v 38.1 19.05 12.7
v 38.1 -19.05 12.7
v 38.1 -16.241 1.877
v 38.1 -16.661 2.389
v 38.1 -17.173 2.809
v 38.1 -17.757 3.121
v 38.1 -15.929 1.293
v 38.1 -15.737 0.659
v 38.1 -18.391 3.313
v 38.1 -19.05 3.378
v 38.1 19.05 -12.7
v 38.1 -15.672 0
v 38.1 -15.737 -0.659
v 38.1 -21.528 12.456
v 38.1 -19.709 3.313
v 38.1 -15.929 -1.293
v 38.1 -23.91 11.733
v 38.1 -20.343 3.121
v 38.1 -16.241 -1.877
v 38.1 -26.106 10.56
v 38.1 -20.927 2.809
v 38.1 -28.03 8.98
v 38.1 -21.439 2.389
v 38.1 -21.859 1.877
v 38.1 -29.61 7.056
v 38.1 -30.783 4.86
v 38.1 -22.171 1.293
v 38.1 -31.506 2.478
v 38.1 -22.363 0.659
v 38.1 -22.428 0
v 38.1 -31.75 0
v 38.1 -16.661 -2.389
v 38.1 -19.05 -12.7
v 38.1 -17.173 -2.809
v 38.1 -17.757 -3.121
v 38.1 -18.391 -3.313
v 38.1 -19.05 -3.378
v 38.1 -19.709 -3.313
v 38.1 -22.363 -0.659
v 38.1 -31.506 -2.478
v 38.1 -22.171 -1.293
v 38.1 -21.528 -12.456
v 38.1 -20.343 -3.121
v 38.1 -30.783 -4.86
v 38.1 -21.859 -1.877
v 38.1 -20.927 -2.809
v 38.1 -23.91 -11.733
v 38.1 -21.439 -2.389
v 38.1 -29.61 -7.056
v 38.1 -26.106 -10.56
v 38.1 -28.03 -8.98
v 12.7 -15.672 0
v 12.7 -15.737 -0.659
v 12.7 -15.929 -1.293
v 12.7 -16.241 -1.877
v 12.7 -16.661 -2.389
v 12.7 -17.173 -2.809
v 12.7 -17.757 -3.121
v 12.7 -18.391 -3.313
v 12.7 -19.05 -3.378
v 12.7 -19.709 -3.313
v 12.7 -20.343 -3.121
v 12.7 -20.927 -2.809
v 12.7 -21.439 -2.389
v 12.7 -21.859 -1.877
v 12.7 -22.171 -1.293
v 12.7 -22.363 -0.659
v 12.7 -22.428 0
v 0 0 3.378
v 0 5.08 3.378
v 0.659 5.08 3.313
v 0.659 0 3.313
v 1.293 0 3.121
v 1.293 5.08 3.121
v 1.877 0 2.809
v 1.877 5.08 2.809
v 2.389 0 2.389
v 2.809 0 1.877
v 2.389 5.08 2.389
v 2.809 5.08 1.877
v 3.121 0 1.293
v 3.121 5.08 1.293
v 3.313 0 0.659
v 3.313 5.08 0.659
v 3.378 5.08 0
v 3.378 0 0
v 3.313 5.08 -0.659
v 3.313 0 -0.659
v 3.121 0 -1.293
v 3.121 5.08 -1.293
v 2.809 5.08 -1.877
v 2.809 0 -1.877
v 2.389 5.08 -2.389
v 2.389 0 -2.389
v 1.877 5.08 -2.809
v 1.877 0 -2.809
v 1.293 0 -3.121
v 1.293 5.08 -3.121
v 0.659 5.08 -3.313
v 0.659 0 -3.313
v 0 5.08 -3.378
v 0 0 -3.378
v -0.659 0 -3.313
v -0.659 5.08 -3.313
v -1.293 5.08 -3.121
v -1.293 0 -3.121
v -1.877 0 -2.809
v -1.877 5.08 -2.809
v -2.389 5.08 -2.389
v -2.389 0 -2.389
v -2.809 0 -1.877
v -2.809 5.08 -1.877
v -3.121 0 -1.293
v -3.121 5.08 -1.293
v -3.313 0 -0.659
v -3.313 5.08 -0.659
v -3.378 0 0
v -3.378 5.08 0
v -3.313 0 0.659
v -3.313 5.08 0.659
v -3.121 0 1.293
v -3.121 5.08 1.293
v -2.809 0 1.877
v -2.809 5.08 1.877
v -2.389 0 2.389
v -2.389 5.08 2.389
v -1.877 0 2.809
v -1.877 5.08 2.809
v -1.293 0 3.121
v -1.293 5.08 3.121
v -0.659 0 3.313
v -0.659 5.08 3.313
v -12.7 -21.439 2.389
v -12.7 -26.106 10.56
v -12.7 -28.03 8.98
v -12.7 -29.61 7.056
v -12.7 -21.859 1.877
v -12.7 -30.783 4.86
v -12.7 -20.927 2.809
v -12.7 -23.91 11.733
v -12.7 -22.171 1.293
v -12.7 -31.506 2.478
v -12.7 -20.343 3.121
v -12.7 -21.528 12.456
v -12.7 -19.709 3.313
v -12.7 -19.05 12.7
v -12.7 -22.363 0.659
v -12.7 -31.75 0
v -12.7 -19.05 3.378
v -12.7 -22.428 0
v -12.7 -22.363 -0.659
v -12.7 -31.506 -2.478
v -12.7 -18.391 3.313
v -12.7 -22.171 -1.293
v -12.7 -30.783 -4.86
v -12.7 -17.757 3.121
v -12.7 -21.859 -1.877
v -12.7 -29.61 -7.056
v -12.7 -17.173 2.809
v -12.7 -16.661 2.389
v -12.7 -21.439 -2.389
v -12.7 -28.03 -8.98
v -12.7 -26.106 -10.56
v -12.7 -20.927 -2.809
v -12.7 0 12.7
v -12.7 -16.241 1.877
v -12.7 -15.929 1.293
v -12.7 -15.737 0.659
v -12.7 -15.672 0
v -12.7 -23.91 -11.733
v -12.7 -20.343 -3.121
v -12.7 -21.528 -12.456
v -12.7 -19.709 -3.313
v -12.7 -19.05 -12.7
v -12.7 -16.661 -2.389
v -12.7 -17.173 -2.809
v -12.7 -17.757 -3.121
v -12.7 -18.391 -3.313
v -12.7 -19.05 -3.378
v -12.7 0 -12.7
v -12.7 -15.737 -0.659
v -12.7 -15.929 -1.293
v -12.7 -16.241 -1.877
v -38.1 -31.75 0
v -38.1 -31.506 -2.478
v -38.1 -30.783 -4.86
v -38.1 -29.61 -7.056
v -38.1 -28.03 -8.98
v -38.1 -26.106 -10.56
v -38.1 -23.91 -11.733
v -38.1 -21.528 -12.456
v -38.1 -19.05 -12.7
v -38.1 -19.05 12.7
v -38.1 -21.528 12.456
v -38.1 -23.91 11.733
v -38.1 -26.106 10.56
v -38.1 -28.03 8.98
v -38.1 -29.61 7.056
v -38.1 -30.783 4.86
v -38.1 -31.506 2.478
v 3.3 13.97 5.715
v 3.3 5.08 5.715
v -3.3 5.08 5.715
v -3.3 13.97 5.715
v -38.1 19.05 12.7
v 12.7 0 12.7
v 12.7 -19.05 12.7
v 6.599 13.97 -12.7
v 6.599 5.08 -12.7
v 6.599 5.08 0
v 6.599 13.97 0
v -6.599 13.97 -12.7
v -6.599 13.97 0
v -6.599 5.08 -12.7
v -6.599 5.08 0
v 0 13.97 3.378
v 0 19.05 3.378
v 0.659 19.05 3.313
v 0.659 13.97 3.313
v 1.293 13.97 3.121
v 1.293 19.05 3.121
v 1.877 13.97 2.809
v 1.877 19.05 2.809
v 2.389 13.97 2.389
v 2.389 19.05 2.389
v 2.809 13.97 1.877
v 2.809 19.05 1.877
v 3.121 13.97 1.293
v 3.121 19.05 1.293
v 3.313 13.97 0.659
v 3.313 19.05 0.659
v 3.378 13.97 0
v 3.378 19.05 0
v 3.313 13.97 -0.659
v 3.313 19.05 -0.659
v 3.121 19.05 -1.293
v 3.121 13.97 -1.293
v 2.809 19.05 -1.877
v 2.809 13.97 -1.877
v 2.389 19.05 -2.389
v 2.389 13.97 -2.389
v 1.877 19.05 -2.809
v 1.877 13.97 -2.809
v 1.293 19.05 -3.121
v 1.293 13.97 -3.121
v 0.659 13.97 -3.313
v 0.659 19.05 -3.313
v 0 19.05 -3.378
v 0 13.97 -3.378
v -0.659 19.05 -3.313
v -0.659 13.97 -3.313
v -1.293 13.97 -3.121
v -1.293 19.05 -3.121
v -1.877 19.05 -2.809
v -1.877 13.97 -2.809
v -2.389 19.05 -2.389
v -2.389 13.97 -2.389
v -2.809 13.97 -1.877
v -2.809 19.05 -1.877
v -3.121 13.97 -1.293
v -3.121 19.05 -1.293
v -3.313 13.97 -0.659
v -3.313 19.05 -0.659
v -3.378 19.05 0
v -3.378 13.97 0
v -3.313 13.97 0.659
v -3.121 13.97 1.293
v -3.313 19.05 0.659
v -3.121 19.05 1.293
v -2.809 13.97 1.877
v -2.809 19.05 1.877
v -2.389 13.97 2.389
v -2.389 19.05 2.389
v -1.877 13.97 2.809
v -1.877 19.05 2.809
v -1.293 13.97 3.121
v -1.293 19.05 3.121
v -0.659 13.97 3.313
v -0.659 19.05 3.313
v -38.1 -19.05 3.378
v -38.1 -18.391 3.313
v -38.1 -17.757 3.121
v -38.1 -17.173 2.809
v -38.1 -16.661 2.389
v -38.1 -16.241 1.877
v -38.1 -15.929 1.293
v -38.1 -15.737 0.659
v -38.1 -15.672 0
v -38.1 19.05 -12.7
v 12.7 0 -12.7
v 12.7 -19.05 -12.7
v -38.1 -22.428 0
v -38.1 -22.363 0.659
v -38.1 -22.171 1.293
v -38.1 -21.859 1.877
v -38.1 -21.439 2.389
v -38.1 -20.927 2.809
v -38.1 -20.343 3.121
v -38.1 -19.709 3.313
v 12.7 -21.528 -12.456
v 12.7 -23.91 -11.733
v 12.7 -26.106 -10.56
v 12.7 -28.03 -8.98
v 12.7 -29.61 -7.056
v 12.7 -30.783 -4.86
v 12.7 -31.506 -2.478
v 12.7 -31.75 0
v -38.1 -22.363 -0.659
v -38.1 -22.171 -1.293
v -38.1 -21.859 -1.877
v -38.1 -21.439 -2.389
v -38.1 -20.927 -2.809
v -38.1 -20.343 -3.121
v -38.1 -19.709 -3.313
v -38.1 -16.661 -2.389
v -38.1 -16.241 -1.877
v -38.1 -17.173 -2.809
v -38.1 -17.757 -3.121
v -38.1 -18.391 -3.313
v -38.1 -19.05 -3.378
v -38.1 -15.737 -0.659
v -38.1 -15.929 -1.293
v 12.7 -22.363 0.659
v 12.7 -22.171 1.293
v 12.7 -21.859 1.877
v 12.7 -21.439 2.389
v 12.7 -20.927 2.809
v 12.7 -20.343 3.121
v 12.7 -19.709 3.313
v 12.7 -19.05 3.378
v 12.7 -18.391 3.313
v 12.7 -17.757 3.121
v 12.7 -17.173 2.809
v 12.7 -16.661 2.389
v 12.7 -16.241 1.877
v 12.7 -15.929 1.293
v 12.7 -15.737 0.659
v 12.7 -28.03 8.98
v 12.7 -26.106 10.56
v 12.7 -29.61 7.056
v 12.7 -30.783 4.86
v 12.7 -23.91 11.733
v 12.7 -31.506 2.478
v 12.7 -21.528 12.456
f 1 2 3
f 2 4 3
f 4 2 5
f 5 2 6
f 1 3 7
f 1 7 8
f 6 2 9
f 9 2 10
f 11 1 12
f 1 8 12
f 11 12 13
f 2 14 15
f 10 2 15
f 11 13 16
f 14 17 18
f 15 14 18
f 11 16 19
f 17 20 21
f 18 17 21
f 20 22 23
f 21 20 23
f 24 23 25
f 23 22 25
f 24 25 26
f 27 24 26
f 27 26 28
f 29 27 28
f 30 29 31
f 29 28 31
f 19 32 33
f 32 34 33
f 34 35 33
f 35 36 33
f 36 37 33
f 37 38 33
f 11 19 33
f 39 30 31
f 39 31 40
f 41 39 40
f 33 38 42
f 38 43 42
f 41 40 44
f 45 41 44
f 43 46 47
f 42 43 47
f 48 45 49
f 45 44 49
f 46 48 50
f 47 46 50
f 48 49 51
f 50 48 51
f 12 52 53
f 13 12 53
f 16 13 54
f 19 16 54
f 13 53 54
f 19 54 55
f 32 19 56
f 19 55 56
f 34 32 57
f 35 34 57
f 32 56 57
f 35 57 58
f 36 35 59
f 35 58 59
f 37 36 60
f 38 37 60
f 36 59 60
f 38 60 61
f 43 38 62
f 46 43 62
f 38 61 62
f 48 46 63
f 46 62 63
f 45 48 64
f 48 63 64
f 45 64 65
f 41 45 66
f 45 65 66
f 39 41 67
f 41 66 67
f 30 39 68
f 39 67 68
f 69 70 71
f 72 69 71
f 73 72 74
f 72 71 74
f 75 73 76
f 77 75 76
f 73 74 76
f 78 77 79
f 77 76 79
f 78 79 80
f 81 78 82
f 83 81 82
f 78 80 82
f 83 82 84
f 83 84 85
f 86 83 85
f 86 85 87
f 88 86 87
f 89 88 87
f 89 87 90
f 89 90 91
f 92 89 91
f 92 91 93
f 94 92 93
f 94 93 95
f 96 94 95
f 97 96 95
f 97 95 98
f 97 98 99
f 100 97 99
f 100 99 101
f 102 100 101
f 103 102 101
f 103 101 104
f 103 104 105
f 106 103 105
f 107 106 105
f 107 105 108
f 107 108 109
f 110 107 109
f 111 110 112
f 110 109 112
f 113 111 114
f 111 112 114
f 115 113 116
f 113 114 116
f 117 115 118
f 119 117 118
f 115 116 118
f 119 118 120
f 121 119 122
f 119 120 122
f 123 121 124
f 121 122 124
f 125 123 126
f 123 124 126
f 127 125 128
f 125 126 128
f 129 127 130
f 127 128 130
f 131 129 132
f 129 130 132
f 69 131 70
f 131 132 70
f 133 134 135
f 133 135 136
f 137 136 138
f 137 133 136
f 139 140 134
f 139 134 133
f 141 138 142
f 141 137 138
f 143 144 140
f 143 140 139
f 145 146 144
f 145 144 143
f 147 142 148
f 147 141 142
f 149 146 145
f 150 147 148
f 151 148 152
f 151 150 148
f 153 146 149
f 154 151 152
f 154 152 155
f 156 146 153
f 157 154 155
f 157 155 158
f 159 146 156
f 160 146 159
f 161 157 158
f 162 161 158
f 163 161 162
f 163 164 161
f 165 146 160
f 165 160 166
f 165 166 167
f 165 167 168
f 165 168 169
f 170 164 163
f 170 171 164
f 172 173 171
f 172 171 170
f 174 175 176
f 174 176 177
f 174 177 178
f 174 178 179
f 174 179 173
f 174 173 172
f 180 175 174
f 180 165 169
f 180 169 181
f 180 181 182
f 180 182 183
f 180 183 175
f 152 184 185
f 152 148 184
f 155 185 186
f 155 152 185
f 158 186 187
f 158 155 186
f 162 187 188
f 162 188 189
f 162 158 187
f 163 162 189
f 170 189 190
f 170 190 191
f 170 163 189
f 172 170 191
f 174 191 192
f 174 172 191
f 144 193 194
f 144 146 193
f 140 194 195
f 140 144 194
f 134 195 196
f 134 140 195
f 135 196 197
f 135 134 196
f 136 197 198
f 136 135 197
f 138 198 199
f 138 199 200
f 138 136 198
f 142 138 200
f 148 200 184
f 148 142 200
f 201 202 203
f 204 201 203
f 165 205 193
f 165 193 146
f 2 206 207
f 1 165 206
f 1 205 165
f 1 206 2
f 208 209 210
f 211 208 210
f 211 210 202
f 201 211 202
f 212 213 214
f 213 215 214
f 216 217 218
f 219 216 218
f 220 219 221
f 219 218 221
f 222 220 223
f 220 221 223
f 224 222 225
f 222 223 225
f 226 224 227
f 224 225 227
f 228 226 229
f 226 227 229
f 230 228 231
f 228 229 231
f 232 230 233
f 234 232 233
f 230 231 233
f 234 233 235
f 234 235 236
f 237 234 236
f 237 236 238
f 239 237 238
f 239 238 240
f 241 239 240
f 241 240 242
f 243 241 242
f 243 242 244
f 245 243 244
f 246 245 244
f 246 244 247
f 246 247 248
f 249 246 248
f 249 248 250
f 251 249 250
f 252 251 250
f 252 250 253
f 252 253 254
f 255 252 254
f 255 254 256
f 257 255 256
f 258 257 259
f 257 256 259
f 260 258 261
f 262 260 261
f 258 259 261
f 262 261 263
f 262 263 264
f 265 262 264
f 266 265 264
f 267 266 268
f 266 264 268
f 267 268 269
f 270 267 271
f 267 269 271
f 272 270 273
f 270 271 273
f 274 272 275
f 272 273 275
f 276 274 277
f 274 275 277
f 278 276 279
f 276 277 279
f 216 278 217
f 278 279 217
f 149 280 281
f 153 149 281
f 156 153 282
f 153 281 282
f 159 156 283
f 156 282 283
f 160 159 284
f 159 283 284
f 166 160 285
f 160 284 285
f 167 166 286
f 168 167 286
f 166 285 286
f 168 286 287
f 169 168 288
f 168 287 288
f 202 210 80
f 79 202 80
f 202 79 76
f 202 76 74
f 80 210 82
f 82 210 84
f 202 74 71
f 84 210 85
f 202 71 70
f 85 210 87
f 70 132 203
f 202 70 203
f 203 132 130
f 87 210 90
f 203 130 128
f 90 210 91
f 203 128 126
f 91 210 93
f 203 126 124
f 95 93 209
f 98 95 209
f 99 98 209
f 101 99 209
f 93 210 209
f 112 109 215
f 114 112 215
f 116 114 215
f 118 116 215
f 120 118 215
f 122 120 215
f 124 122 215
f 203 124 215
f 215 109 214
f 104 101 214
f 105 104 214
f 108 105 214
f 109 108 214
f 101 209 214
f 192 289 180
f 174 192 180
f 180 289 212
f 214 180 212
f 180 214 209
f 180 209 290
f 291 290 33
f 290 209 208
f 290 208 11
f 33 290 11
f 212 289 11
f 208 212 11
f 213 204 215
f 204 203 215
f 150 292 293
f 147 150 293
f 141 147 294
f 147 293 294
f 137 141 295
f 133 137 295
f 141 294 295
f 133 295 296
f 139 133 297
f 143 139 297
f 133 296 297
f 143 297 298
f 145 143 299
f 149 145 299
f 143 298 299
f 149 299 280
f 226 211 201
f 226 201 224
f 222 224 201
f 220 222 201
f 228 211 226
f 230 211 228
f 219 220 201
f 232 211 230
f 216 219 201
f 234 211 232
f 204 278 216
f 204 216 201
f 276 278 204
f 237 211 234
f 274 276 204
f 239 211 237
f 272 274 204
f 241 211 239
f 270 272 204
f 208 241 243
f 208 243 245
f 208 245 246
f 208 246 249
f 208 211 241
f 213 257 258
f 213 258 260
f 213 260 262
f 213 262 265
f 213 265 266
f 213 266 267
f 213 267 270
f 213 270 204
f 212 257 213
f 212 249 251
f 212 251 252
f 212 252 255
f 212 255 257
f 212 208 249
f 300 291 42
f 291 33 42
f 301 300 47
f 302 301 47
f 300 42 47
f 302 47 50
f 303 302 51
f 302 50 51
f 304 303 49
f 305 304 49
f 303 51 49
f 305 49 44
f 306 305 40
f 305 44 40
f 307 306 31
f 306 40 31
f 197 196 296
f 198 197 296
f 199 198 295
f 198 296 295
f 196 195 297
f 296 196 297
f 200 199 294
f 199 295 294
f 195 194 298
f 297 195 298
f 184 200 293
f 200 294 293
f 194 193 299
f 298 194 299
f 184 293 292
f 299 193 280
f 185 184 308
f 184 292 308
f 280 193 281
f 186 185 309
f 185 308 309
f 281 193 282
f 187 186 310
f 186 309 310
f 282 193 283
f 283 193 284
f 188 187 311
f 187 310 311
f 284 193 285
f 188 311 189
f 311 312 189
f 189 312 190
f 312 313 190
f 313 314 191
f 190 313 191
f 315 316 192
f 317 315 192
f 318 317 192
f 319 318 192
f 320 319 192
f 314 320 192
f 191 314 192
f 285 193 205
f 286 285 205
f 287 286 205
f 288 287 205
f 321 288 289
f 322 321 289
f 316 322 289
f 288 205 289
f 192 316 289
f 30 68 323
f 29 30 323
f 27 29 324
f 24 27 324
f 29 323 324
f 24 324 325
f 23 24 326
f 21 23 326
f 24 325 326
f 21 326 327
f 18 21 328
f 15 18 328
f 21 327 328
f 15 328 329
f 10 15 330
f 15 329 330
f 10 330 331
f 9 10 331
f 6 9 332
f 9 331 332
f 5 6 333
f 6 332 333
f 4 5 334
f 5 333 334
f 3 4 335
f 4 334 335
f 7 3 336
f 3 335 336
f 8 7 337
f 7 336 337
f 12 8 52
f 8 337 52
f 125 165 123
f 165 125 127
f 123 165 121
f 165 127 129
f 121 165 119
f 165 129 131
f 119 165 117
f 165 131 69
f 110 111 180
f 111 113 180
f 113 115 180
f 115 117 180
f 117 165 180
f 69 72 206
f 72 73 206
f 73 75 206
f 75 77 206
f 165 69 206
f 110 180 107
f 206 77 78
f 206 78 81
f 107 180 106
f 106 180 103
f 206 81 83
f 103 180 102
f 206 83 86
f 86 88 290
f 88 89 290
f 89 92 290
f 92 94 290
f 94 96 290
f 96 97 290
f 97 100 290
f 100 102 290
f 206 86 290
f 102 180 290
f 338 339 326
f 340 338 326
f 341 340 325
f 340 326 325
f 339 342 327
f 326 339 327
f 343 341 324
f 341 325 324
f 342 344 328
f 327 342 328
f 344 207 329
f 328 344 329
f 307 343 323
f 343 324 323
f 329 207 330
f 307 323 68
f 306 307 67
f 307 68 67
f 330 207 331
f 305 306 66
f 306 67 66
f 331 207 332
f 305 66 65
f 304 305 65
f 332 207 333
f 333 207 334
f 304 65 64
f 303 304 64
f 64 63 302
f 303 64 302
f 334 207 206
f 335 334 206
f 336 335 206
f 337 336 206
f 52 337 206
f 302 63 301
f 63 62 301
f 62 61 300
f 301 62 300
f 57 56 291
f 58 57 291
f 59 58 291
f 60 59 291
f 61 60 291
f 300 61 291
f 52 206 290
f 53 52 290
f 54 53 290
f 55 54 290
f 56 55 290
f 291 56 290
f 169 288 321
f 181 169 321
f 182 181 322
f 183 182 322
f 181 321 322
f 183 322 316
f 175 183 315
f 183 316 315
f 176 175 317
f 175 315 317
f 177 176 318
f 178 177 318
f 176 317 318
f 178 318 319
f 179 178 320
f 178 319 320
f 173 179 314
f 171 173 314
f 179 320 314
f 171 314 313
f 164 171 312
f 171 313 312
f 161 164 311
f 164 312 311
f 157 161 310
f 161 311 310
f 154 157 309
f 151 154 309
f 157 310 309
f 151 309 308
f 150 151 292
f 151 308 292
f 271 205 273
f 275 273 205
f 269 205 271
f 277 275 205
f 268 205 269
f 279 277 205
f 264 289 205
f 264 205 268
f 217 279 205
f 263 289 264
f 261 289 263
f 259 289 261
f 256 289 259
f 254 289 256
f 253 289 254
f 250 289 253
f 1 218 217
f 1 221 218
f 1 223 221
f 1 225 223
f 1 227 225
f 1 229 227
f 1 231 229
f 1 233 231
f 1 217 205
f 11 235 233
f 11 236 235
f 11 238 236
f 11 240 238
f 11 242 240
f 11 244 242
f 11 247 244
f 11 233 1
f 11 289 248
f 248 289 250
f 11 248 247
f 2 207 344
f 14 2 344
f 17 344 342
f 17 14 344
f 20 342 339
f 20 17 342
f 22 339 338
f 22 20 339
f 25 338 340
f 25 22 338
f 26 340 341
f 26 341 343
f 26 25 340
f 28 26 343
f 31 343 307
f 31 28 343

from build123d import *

# Parameters (mm, degrees)
SKETCH1_W           = 76.2
SKETCH1_H           = 25.4
BOSS_EXTRUDE1_DEPTH = 19.05
SKETCH1_7_W         = 25.4
SKETCH1_7_H         = 25.4
BOSS_EXTRUDE3_DEPTH = 31.75
CUT_EXTRUDE4_DEPTH  = 84.521209881
FILLET1_R           = 12.7
SKETCH3_R           = 3.3782
CUT_EXTRUDE5_DEPTH  = 65.757547823
CUT_EXTRUDE6_DEPTH  = 4.445


with BuildPart() as part:
    # Sketch1 → Boss-Extrude1 (new body)
    with BuildSketch(Plane(origin=(0, 0, 0), x_dir=(1, 0, 0), z_dir=(0, 1, 0))):
        Rectangle(SKETCH1_W, SKETCH1_H)
    extrude(amount=BOSS_EXTRUDE1_DEPTH)

    # Sketch1<7> → Boss-Extrude3 (add)
    with BuildSketch(Plane(origin=(0, 0, 0), x_dir=(1, 0, 0), z_dir=(0, 1, 0))):
        with Locations((-25.4, 0)):
            Rectangle(SKETCH1_7_W, SKETCH1_7_H)
        with Locations((25.4, 0)):
            Rectangle(SKETCH1_7_W, SKETCH1_7_H)
    extrude(amount=-BOSS_EXTRUDE3_DEPTH)

    # Sketch2 → Cut-Extrude4 (cut, through all)
    with BuildSketch(Plane.ZY.offset(38.1)):
        with BuildLine():
            ThreePointArc((3.3782, -19.05), (2.388748128, -16.661251872), (0, -15.6718))
            Line((0, -15.6718), (0, -22.4282))
            ThreePointArc((0, -22.4282), (2.388748128, -21.438748128), (3.3782, -19.05))
        make_face()
        with BuildLine():
            Line((0, -22.4282), (0, -15.6718))
            ThreePointArc((0, -15.6718), (-3.3782, -19.05), (0, -22.4282))
        make_face()
    extrude(amount=-CUT_EXTRUDE4_DEPTH, mode=Mode.SUBTRACT)

    # Fillet1
    fillet1_edges = [part.edges().sort_by_distance(p)[0] for p in [
        (-25.4, -31.75, 12.7),
        (25.4, -31.75, 12.7),
        (25.4, -31.75, -12.7),
        (-25.4, -31.75, -12.7),
    ]]
    fillet(fillet1_edges, radius=FILLET1_R - 0.0001)  # a hair under: the kernel refuses the full size

    # Sketch3 → Cut-Extrude5 (cut, through all)
    with BuildSketch(Plane(origin=(0, 19.05, 0), x_dir=(1, 0, 0), z_dir=(0, 1, 0))):
        with Locations(Location((0, 0, 0), (0, 0, 270))):
            Circle(SKETCH3_R)
    extrude(amount=-CUT_EXTRUDE5_DEPTH, mode=Mode.SUBTRACT)

    # Sketch4 → Cut-Extrude6 (cut, symmetric)
    with BuildSketch(Plane(origin=(0, 9.525, 0), x_dir=(-1, 0, 0), z_dir=(0, -1, 0))):
        Polygon((6.599113577, 12.7), (-6.599113577, 12.7), (-6.599113577, 0), (-3.299556788, 5.715), (3.299556788, 5.715), (6.599113577, 0), align=None)
        Polygon((-6.599113577, 0), (-3.299556788, -5.715), (3.299556788, -5.715), (6.599113577, 0), (3.299556788, 5.715), (-3.299556788, 5.715), align=None)
    extrude(amount=CUT_EXTRUDE6_DEPTH, both=True, mode=Mode.SUBTRACT)


solid = part.part
